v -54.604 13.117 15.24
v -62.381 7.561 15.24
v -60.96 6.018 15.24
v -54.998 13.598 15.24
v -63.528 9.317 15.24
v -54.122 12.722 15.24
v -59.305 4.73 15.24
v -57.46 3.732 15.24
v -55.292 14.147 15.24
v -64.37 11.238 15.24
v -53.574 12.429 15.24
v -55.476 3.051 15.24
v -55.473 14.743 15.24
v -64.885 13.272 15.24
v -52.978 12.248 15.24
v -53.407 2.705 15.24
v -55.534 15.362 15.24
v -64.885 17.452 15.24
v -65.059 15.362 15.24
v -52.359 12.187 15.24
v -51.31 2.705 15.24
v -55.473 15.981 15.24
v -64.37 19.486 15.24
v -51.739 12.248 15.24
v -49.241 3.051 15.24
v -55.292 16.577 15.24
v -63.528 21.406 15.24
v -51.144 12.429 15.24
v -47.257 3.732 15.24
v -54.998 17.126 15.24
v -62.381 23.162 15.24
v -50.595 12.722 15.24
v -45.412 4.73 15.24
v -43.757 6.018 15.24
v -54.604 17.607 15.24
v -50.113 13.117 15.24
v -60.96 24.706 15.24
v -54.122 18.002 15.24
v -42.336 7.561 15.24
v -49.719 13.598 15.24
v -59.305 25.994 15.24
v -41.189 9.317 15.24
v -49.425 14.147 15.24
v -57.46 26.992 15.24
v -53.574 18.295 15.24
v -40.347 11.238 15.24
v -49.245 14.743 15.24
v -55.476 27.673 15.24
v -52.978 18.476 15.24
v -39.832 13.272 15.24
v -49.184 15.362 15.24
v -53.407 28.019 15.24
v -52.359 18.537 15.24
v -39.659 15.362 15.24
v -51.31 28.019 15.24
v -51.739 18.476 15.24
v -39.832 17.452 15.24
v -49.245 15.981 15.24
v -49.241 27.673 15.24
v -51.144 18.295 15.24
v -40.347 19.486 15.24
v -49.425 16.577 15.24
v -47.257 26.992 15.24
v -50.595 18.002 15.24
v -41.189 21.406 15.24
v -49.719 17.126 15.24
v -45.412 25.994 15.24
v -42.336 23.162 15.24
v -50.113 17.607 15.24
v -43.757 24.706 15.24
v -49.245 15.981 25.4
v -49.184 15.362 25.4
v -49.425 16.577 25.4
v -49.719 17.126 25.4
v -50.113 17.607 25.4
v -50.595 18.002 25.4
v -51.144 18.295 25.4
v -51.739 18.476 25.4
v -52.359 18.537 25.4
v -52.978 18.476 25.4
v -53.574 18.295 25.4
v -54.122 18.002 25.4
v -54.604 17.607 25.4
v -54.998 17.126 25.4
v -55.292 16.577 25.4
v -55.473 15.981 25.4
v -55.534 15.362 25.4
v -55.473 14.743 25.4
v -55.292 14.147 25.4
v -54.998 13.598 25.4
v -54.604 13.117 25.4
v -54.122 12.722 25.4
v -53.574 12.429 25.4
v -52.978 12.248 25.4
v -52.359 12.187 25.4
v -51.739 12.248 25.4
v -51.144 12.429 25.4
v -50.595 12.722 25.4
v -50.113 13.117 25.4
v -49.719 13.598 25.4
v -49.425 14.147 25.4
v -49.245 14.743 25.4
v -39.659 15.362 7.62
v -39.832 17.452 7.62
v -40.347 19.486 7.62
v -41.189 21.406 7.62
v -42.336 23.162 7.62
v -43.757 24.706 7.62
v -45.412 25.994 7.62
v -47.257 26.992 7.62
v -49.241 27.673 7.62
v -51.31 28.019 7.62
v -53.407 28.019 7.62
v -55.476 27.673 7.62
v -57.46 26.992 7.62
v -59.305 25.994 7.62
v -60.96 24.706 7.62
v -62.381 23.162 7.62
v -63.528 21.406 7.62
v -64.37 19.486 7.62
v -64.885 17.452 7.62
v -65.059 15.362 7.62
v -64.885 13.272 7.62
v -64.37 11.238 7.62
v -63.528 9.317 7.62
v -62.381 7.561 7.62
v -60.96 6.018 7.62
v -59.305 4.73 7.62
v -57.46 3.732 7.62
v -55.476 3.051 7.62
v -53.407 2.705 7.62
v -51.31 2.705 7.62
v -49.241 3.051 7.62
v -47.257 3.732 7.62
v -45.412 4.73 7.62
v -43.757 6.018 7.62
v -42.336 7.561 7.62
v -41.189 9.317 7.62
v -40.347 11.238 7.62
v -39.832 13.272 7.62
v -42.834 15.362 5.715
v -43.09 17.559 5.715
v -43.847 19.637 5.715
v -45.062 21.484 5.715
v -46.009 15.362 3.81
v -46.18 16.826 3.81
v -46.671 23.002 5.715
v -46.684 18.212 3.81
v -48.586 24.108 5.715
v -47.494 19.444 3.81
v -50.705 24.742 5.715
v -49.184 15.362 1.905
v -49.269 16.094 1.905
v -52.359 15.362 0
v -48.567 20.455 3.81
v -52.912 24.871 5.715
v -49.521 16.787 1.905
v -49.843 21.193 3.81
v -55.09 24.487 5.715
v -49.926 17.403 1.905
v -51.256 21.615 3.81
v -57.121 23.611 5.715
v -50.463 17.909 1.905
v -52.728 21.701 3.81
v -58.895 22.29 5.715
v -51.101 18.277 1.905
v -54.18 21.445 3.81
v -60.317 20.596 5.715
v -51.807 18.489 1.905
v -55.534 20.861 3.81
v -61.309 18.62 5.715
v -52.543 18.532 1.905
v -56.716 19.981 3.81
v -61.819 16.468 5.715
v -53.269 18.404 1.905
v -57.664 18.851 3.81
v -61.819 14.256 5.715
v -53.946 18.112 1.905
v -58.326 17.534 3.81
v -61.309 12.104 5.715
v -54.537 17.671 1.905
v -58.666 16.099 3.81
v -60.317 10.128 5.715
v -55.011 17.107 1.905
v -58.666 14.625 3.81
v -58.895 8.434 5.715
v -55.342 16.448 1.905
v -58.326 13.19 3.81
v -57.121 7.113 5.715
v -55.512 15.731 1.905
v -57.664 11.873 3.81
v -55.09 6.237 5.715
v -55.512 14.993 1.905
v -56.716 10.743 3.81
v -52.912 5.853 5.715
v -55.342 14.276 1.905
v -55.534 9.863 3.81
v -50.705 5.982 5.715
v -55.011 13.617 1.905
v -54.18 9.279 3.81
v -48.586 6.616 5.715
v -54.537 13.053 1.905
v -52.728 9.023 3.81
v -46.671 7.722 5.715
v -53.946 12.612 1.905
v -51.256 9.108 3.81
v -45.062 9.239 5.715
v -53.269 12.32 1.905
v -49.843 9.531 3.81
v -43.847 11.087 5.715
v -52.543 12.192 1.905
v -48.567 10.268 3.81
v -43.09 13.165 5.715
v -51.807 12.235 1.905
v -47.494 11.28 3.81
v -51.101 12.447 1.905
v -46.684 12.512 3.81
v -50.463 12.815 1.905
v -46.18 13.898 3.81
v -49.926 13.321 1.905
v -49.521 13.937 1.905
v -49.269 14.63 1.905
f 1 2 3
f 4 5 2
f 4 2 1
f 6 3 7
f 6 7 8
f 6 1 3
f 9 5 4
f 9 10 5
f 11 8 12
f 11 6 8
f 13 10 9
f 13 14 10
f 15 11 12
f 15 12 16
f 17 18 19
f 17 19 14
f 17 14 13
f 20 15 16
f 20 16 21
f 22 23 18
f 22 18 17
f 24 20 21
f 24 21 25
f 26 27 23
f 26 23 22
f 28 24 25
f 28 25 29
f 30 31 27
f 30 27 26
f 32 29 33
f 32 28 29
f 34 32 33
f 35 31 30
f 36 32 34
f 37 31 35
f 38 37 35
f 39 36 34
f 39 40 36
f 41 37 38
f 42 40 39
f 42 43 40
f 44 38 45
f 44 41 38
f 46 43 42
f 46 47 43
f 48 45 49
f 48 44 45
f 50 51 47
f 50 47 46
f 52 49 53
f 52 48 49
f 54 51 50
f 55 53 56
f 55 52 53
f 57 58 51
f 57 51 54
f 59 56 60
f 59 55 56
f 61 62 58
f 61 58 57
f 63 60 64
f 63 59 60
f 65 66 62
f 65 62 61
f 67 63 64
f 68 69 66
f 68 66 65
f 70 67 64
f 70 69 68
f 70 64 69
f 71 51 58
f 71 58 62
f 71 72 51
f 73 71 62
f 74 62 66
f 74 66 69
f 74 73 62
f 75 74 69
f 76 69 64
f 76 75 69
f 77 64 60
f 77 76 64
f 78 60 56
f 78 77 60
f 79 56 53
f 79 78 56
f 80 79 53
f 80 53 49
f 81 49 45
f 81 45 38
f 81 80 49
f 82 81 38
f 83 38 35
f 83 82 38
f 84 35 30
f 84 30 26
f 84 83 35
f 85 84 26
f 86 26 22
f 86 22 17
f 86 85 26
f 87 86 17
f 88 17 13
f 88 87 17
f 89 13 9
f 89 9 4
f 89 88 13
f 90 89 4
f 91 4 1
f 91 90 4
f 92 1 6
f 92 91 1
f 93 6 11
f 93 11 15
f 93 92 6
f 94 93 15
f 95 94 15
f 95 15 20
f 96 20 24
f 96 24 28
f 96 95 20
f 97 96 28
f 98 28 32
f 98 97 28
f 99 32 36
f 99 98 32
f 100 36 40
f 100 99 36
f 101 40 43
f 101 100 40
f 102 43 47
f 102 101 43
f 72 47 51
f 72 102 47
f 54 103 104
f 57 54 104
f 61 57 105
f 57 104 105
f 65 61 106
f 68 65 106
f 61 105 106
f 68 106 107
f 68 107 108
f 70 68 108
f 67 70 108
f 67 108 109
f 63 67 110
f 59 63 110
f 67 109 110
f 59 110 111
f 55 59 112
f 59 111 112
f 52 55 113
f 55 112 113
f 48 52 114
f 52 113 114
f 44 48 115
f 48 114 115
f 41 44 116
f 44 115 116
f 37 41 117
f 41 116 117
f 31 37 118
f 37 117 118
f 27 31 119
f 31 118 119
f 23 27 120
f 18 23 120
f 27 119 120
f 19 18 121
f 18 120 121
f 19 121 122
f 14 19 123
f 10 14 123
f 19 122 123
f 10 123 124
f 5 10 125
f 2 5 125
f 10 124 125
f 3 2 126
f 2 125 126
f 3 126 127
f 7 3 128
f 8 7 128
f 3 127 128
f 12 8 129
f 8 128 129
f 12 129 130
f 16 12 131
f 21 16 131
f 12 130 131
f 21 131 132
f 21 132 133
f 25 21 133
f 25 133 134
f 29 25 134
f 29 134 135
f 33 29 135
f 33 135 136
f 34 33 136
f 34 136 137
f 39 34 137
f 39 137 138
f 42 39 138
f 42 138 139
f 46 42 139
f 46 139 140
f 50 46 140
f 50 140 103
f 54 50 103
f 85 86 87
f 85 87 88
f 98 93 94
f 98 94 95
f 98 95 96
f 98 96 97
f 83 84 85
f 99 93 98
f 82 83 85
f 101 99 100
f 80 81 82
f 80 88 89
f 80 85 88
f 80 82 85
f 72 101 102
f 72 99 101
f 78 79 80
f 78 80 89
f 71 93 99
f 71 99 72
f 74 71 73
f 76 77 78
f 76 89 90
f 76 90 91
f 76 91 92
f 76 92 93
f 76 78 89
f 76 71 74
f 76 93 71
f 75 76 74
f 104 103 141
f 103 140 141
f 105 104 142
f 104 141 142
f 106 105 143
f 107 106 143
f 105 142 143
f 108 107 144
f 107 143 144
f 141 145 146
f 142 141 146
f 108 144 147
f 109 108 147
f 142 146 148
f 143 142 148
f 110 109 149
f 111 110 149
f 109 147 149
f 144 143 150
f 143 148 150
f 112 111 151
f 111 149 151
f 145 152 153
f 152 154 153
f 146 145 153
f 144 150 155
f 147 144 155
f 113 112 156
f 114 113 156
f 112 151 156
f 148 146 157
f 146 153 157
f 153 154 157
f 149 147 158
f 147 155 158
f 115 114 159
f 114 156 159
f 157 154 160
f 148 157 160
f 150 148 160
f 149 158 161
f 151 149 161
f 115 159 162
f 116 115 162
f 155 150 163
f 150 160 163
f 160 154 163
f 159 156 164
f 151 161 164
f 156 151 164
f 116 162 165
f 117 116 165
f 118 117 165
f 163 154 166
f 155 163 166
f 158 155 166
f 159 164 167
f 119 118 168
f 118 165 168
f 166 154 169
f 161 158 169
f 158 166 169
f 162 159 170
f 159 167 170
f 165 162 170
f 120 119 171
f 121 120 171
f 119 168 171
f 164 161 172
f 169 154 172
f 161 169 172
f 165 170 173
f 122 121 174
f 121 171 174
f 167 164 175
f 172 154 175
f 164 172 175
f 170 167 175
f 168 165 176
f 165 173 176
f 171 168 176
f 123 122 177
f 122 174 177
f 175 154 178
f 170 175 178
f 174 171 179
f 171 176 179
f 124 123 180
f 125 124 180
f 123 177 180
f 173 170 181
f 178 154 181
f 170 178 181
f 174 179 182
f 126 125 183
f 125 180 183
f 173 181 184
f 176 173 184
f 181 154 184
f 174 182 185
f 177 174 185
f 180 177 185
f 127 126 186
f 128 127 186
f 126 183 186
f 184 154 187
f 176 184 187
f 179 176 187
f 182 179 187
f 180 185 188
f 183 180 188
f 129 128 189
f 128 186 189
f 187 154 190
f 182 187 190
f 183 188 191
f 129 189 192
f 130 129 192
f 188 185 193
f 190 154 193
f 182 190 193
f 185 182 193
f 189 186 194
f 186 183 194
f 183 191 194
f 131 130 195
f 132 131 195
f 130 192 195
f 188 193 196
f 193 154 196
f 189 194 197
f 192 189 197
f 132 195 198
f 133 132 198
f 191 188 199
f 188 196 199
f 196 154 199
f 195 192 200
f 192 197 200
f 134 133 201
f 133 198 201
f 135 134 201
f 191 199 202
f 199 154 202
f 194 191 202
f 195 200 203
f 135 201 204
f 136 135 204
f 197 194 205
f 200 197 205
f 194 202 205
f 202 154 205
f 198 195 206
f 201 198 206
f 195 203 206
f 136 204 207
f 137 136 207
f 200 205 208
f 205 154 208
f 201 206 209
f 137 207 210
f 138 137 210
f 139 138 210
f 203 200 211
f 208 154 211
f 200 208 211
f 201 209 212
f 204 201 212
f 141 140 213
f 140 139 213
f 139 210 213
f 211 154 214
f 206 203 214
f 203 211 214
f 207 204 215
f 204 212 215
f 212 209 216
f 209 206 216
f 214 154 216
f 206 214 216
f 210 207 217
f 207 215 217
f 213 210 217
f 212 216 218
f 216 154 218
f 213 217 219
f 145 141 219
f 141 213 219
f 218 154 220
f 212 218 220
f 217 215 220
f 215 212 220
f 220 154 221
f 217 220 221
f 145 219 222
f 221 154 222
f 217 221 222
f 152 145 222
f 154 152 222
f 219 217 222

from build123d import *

# Parameters (mm, degrees)
F0_R     = 12.7
F1_DEPTH = 15.24
F2_SIZE2 = 12.7
F2_SIZE  = 7.62
F4_R     = 3.175
F5_R     = 3.175


with BuildPart() as f1:
    # F0 (on Top) → F1 (new body)
    with BuildSketch(Plane.XY):
        with Locations((-52.3585453629, 15.3619199991)):
            Circle(F0_R)
    extrude(amount=F1_DEPTH)

    # F2
    f2_edges = [f1.edges().sort_by_distance(p)[0] for p in [
        (-65.058545, 15.36192, 0),
    ]]
    f2_side = f1.faces().sort_by_distance((-65.058545, 15.36192, 7.62))[0]
    chamfer(f2_edges, length=F2_SIZE, length2=F2_SIZE2, reference=f2_side)

    # F4 (on face) → F6 section 0
    with BuildSketch(Plane.XY.offset(15.24)):
        with Locations((-52.3585453629, 15.3619199991)):
            Circle(F4_R)
    # F5 (on offset) → F6 section 1
    with BuildSketch(Plane.XY.offset(25.4)):
        with Locations((-52.3585453629, 15.3619199991)):
            Circle(F5_R)
    loft()


solid = f1.part
